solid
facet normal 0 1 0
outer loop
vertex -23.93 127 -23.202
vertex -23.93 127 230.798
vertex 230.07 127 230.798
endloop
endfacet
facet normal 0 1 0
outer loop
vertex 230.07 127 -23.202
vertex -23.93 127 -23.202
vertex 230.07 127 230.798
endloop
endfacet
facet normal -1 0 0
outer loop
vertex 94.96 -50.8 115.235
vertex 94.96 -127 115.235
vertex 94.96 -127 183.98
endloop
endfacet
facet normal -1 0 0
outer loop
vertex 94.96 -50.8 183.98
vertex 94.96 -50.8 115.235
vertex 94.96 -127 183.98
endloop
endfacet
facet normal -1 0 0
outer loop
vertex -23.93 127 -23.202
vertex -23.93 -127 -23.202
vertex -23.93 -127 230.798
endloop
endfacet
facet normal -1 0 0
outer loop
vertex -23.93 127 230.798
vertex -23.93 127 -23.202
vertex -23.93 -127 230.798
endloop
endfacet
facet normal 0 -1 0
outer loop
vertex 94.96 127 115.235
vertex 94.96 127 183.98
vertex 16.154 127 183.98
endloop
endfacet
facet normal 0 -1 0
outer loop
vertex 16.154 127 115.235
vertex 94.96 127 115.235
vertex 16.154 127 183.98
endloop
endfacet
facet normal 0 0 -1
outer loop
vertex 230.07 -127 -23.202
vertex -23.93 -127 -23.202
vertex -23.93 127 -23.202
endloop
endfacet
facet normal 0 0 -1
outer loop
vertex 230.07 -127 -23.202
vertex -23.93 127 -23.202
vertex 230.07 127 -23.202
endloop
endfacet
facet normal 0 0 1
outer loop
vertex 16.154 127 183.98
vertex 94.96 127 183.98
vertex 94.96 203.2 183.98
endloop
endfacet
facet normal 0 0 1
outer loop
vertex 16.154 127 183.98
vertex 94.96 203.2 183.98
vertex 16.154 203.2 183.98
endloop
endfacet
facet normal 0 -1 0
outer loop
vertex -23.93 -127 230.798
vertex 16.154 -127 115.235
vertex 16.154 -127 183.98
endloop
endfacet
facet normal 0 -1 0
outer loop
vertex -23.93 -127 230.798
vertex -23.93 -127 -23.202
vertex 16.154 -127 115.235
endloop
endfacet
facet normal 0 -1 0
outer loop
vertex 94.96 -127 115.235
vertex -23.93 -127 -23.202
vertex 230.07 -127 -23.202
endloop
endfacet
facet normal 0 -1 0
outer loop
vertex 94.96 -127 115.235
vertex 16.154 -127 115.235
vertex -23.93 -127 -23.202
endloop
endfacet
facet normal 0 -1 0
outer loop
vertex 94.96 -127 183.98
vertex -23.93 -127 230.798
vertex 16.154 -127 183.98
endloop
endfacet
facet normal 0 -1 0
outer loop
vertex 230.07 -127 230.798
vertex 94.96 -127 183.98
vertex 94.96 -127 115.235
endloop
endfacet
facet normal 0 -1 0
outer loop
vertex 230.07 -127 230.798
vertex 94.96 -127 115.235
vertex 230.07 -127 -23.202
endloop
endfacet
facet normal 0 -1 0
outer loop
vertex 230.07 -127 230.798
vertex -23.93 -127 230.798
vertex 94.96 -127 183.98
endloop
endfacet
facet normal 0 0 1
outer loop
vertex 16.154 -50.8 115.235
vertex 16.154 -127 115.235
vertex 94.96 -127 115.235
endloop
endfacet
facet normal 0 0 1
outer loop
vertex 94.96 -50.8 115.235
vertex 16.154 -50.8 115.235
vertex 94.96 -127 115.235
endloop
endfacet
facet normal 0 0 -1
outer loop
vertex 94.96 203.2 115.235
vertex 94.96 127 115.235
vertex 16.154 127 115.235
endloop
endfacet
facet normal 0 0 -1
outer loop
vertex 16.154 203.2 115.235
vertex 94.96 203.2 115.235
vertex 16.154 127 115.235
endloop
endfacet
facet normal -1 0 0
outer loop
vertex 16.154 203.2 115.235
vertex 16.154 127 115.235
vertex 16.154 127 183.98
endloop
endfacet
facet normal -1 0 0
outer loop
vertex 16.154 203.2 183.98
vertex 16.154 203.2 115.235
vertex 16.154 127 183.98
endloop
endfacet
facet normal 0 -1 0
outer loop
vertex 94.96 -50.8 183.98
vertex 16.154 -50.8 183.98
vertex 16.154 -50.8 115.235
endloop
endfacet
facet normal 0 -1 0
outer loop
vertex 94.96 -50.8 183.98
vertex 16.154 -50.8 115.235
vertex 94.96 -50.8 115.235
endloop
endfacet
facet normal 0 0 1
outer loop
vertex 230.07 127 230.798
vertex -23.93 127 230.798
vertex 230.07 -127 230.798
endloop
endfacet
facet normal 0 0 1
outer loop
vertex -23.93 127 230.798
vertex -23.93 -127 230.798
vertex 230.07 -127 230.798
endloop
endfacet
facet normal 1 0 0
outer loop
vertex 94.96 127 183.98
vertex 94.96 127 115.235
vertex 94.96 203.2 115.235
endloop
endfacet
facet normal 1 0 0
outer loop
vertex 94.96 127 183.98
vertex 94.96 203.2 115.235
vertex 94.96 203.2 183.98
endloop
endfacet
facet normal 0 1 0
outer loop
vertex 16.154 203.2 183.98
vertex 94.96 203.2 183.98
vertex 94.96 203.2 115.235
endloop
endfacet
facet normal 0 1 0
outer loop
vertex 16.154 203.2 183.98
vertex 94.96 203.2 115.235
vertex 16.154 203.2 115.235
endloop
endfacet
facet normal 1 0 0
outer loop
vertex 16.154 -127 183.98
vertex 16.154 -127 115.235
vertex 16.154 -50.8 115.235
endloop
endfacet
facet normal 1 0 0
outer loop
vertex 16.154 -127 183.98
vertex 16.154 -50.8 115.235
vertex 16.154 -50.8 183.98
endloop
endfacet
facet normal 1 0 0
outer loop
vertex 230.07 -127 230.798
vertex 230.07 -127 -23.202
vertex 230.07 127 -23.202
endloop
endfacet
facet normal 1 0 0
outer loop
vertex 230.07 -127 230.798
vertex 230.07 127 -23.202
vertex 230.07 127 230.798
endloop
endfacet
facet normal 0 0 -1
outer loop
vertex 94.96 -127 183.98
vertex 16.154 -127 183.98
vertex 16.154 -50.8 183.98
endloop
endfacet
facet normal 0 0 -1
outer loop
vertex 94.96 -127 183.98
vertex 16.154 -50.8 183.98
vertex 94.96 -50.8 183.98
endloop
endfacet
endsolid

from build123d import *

# Parameters (mm, degrees)
F1_W     = 254
F1_H     = 254
F2_DEPTH = 127
F3_W     = 78.8055062294
F3_H     = 68.7452331185
F4_DEPTH = 76.2
F5_W     = 78.8055062294
F5_H     = 68.7452331185
F6_DEPTH = 76.2


# Not quite as in the source:
# - a variable given as a bare number and used for a length is read in inches; the dataset says mm whatever the document's units were


with BuildPart() as f2:
    # F1 (on Front) → F2 (new body, symmetric)
    with BuildSketch(Plane.XZ):
        with Locations((103.069830358, 103.7981395125)):
            Rectangle(F1_W, F1_H)
    extrude(amount=F2_DEPTH, both=True)

    # F3 (on face) → F4 (cut)
    with BuildSketch(Plane.XZ.offset(127)):
        with Locations((55.5568262935, 149.6073119342)):
            Rectangle(F3_W, F3_H)
    extrude(amount=-F4_DEPTH, mode=Mode.SUBTRACT)


with BuildPart() as f6:
    # F5 (on face) → F6 (new body)
    with BuildSketch(Plane(origin=(0, 127, 0), x_dir=(-1, 0, 0), z_dir=(0, 1, 0))):
        with Locations((-55.5568262935, 149.6073119342)):
            Rectangle(F5_W, F5_H)
    extrude(amount=F6_DEPTH)


solid = Compound([f2.part, f6.part])
